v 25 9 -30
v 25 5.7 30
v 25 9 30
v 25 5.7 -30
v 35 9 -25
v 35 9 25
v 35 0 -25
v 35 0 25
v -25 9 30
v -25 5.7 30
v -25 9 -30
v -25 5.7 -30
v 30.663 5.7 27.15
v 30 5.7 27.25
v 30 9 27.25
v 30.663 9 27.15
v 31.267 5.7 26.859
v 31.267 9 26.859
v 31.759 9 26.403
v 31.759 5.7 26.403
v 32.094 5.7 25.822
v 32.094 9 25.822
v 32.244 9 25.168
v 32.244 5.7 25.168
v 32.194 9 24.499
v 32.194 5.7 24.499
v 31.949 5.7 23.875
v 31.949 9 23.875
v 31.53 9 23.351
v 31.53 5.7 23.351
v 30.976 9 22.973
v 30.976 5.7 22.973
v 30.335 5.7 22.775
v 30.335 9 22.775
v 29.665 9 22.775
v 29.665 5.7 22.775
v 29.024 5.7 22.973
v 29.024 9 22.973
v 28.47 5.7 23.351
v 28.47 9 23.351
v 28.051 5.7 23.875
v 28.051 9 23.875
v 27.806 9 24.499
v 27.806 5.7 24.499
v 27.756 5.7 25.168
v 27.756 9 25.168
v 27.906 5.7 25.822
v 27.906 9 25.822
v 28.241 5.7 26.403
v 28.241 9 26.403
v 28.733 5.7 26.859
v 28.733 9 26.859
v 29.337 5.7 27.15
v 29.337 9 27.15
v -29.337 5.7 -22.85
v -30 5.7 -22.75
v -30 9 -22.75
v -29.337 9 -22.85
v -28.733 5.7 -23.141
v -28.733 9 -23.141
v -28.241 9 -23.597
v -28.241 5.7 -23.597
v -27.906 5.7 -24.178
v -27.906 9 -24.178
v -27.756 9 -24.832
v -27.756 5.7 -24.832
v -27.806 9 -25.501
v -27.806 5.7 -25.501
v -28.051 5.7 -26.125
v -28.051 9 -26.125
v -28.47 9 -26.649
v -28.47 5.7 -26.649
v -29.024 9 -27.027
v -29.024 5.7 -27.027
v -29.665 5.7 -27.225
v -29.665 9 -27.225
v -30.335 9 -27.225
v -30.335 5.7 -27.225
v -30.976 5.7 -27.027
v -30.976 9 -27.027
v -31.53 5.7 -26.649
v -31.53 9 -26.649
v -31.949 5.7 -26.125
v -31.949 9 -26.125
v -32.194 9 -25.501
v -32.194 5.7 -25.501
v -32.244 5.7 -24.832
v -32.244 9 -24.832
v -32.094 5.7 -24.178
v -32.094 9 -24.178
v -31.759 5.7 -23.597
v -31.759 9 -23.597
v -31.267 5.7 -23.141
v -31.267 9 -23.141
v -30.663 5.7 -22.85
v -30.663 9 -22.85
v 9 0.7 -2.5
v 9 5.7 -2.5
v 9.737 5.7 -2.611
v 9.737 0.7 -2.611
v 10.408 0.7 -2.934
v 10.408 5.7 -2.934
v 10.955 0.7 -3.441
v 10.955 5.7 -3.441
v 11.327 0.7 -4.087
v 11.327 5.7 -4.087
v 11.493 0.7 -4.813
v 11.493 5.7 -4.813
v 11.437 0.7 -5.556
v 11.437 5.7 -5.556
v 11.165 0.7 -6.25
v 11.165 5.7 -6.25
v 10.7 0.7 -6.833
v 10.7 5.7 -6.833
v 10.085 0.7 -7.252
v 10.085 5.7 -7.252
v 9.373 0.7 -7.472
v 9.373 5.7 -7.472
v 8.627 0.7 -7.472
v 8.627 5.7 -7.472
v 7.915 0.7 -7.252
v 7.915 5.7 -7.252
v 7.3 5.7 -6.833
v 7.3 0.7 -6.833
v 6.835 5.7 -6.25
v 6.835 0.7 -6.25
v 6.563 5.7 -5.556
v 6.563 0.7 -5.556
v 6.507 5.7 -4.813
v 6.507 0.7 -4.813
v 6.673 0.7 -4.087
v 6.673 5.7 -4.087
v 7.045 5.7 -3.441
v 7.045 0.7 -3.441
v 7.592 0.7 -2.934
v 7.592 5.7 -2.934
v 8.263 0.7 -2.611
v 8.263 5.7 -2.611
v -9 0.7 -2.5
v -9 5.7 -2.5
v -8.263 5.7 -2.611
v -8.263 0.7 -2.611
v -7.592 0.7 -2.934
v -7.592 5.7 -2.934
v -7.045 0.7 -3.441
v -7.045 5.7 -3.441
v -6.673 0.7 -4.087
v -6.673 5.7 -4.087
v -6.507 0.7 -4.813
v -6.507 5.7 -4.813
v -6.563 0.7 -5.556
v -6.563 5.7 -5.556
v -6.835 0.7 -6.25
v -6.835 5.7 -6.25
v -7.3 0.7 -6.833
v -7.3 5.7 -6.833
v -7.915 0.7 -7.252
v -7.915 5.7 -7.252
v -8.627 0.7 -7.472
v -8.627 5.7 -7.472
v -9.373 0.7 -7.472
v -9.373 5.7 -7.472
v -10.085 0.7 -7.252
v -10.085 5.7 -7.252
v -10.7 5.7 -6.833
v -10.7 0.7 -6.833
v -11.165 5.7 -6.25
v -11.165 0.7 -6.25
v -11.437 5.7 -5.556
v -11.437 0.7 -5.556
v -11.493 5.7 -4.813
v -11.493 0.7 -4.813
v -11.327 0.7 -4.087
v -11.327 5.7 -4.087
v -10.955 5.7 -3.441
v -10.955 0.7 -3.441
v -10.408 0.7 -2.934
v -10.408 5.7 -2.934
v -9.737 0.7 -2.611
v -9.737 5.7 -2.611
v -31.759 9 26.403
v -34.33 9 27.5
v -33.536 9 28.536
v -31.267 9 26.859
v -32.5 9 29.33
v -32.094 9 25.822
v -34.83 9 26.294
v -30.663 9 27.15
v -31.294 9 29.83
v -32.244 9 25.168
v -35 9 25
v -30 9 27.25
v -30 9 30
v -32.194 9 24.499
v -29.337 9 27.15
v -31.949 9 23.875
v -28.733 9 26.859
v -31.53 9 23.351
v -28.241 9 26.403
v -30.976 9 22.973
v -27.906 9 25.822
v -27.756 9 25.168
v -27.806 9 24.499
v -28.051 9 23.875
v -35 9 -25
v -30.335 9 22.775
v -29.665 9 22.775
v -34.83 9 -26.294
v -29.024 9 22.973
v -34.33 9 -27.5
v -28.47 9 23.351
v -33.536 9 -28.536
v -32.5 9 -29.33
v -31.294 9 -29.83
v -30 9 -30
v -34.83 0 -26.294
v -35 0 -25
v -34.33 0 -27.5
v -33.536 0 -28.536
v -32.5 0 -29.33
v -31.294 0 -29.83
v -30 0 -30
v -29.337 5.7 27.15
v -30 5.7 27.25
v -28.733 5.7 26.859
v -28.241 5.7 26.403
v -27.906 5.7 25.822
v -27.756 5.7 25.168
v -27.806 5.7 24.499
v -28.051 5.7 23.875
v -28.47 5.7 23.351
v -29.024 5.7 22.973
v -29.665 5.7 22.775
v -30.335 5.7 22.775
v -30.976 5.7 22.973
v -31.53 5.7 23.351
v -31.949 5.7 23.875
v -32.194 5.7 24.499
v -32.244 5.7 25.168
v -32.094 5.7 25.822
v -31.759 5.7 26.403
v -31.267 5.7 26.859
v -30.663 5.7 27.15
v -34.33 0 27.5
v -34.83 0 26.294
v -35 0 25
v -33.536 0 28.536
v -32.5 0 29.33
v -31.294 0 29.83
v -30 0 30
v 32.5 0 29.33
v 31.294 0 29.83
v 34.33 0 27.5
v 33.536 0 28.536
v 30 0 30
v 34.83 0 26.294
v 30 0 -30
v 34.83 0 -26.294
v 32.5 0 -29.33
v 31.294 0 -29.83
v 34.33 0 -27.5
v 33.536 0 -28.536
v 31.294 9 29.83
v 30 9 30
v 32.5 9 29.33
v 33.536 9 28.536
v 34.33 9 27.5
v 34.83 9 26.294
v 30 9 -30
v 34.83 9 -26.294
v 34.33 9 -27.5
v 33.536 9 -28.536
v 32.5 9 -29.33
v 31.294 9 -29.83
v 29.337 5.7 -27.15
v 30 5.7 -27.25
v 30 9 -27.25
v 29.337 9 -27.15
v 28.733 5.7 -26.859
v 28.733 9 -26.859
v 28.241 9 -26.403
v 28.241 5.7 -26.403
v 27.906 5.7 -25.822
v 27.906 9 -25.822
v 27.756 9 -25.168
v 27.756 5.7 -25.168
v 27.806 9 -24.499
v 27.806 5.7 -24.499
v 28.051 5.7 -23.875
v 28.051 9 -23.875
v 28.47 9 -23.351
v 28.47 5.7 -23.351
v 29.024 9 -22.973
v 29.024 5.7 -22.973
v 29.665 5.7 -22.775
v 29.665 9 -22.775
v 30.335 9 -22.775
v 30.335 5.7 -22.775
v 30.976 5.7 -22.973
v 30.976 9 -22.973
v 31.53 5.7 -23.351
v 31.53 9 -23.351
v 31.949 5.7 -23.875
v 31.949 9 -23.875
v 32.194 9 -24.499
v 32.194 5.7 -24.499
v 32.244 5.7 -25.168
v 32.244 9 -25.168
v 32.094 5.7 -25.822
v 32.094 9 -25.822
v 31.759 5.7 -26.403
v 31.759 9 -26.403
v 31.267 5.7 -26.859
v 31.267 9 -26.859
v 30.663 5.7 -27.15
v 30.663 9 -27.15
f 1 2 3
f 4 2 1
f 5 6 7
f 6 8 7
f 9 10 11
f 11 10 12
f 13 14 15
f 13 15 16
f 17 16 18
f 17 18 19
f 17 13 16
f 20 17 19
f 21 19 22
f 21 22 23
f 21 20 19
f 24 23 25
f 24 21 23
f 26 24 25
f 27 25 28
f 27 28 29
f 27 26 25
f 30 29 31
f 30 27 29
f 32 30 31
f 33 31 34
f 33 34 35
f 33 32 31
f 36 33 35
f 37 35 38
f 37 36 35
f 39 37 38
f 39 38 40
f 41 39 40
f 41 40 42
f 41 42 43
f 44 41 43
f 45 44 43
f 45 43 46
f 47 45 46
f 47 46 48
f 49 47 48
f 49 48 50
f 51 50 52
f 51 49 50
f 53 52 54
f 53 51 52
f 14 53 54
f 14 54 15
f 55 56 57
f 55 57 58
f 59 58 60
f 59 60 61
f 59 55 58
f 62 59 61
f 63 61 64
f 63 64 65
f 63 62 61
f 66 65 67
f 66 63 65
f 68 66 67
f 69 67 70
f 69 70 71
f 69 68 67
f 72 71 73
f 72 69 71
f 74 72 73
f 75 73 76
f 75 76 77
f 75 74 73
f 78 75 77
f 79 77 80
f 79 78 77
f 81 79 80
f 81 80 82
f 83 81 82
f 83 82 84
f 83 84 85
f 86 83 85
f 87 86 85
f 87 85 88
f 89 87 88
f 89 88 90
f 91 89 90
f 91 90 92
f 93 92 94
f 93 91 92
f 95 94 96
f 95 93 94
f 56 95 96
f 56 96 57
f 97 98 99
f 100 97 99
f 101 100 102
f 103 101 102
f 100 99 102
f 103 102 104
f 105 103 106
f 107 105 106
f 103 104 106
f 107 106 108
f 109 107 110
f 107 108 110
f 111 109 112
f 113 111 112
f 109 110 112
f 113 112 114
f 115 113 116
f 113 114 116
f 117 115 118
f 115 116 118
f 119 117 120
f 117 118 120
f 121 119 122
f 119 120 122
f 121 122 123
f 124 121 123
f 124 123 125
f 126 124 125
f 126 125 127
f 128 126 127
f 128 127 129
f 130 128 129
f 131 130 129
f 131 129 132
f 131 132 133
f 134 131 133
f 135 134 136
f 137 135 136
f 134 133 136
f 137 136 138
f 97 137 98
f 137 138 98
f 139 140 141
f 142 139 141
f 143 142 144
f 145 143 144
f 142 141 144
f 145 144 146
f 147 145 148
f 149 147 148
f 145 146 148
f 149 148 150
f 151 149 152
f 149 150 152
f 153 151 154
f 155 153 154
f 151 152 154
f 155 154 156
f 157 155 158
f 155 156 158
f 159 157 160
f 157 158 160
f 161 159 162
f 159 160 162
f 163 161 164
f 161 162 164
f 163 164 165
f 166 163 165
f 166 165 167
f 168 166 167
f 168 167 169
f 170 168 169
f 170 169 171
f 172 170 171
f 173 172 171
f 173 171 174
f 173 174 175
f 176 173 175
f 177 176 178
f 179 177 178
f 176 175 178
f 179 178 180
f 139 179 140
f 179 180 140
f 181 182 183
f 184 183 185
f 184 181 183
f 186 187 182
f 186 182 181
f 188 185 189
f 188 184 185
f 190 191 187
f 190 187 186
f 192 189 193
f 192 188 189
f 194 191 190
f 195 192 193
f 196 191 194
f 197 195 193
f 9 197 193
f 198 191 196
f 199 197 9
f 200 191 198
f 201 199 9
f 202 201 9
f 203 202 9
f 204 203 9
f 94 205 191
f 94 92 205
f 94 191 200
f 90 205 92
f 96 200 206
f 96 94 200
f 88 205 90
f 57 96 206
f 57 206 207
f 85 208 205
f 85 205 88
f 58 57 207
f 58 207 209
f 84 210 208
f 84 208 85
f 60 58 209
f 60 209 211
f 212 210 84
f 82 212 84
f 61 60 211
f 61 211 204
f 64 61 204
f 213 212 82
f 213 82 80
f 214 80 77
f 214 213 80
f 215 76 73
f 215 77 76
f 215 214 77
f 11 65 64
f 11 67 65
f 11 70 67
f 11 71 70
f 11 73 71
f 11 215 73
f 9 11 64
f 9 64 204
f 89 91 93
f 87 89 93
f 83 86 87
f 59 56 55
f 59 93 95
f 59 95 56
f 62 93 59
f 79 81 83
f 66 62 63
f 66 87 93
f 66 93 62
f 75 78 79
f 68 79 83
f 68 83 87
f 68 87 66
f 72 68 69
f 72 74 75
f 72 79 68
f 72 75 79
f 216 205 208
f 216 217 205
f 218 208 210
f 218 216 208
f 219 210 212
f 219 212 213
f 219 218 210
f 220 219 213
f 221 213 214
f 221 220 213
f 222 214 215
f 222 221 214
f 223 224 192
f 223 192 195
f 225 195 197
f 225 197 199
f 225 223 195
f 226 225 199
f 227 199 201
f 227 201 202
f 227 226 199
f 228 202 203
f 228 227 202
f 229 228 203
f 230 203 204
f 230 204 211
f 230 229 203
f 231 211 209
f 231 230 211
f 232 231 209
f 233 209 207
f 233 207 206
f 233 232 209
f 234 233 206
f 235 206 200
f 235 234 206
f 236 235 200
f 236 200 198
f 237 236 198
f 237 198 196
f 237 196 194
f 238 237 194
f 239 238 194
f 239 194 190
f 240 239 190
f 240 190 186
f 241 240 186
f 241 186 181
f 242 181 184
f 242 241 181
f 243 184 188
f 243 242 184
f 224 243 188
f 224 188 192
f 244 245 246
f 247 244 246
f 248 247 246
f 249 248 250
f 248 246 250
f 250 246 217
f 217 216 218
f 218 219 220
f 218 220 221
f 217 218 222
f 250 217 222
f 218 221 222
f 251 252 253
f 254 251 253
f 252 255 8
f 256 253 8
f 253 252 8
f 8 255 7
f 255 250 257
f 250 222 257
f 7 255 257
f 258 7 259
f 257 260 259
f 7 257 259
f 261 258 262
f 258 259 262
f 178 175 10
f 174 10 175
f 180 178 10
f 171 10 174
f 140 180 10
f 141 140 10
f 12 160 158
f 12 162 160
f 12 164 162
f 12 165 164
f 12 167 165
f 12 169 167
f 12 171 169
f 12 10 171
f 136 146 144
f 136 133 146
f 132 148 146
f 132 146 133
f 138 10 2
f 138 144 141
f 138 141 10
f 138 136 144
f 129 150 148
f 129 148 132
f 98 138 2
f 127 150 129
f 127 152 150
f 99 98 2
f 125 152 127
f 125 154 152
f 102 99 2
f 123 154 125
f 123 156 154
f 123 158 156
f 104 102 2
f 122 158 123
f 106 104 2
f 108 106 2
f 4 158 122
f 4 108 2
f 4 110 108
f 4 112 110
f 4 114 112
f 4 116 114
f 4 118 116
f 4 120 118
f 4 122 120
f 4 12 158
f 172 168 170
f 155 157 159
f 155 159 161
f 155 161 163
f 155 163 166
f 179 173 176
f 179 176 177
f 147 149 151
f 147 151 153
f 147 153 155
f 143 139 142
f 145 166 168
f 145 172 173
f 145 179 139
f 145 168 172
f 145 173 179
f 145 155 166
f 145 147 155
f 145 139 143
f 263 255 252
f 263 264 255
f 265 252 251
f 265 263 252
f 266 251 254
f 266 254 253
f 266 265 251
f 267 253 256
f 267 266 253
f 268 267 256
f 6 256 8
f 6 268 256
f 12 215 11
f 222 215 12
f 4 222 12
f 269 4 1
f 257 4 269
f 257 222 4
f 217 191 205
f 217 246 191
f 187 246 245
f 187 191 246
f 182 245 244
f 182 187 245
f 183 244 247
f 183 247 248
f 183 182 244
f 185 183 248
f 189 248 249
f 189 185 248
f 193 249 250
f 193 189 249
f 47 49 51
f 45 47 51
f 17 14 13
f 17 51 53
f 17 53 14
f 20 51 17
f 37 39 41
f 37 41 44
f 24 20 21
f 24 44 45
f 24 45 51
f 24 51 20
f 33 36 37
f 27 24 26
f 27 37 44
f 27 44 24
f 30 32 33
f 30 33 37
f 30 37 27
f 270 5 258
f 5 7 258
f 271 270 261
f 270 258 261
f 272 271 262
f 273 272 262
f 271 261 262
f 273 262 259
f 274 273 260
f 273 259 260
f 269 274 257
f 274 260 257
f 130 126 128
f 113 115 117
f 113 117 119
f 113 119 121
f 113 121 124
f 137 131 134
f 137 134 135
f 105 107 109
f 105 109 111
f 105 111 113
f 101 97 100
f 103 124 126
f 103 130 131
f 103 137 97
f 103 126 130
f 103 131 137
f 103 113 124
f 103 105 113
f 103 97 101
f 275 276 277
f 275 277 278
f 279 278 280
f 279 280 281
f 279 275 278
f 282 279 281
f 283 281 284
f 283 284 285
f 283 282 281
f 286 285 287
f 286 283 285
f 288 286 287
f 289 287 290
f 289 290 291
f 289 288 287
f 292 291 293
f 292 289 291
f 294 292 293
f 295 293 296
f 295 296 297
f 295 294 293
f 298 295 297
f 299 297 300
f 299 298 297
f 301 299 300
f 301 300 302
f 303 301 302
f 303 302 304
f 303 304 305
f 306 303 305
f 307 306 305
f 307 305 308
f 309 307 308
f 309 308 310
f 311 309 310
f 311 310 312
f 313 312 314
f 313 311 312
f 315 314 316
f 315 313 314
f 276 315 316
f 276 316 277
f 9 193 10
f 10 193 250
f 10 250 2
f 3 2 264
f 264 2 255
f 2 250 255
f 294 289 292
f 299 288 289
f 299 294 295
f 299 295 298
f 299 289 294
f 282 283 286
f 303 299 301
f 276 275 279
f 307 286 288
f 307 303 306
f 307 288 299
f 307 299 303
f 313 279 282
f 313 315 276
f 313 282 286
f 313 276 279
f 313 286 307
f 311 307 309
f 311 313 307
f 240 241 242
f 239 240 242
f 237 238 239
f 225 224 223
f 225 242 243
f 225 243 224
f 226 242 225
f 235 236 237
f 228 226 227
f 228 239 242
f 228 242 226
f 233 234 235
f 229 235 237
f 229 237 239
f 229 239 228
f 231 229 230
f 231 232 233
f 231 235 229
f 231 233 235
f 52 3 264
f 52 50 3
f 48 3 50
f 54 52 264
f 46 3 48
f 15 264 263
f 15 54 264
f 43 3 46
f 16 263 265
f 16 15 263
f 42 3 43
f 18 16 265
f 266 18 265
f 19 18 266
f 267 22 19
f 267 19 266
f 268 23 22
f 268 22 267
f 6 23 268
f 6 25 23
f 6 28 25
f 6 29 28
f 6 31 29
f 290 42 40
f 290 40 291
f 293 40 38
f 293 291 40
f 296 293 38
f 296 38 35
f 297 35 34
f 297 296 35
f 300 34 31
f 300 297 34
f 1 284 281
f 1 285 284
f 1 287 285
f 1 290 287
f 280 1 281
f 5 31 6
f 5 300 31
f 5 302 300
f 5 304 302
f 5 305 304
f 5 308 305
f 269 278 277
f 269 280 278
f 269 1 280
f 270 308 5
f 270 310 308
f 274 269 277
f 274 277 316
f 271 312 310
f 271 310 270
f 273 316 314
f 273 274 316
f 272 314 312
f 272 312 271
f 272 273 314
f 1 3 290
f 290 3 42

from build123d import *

# Parameters (mm, degrees)
SKETCH1_W           = 70
SKETCH1_H           = 60
BOSS_EXTRUDE1_DEPTH = 5.7
SKETCH2_W           = 10
SKETCH2_H           = 60
SKETCH2_R           = 2.25
BOSS_EXTRUDE2_DEPTH = 3.3
FILLET1_R           = 5
SKETCH2_4_R         = 2.5
CUT_EXTRUDE2_DEPTH  = 5


with BuildPart() as part:
    # Sketch1 → Boss-Extrude1 (new body)
    with BuildSketch(Plane(origin=(0, 0, 0), x_dir=(1, 0, 0), z_dir=(0, 1, 0))):
        Rectangle(SKETCH1_W, SKETCH1_H)
    extrude(amount=BOSS_EXTRUDE1_DEPTH)

    # Sketch2 → Boss-Extrude2 (add)
    # profile 1 of 2: a face of its own
    with BuildSketch(Plane(origin=(0, 5.7, 0), x_dir=(1, 0, 0), z_dir=(0, 1, 0))):
        with Locations((-30, 0)):
            Rectangle(SKETCH2_W, SKETCH2_H)
        with Locations((-30, -25)):
            Circle(SKETCH2_R, mode=Mode.SUBTRACT)
        with Locations((-30, 25)):
            Circle(SKETCH2_R, mode=Mode.SUBTRACT)
    # profile 2 of 2: a face of its own
    with BuildSketch(Plane(origin=(0, 5.7, 0), x_dir=(1, 0, 0), z_dir=(0, 1, 0))):
        with Locations((30, 0)):
            Rectangle(SKETCH2_W, SKETCH2_H)
        with Locations((30, -25)):
            Circle(SKETCH2_R, mode=Mode.SUBTRACT)
        with Locations((30, 25)):
            Circle(SKETCH2_R, mode=Mode.SUBTRACT)
    extrude(amount=BOSS_EXTRUDE2_DEPTH)

    # Fillet1
    fillet1_edges = [part.edges().sort_by_distance(p)[0] for p in [
        (35, 4.5, 30),
        (35, 4.5, -30),
        (-35, 4.5, -30),
        (-35, 4.5, 30),
    ]]
    fillet(fillet1_edges, radius=FILLET1_R)

    # Sketch2<4> → Cut-Extrude2 (cut)
    with BuildSketch(Plane(origin=(0, 5.7, 0), x_dir=(1, 0, 0), z_dir=(0, 1, 0))):
        with Locations((-9, 5)):
            Circle(SKETCH2_4_R)
        with Locations((9, 5)):
            Circle(SKETCH2_4_R)
    extrude(amount=-CUT_EXTRUDE2_DEPTH, mode=Mode.SUBTRACT)


solid = part.part
